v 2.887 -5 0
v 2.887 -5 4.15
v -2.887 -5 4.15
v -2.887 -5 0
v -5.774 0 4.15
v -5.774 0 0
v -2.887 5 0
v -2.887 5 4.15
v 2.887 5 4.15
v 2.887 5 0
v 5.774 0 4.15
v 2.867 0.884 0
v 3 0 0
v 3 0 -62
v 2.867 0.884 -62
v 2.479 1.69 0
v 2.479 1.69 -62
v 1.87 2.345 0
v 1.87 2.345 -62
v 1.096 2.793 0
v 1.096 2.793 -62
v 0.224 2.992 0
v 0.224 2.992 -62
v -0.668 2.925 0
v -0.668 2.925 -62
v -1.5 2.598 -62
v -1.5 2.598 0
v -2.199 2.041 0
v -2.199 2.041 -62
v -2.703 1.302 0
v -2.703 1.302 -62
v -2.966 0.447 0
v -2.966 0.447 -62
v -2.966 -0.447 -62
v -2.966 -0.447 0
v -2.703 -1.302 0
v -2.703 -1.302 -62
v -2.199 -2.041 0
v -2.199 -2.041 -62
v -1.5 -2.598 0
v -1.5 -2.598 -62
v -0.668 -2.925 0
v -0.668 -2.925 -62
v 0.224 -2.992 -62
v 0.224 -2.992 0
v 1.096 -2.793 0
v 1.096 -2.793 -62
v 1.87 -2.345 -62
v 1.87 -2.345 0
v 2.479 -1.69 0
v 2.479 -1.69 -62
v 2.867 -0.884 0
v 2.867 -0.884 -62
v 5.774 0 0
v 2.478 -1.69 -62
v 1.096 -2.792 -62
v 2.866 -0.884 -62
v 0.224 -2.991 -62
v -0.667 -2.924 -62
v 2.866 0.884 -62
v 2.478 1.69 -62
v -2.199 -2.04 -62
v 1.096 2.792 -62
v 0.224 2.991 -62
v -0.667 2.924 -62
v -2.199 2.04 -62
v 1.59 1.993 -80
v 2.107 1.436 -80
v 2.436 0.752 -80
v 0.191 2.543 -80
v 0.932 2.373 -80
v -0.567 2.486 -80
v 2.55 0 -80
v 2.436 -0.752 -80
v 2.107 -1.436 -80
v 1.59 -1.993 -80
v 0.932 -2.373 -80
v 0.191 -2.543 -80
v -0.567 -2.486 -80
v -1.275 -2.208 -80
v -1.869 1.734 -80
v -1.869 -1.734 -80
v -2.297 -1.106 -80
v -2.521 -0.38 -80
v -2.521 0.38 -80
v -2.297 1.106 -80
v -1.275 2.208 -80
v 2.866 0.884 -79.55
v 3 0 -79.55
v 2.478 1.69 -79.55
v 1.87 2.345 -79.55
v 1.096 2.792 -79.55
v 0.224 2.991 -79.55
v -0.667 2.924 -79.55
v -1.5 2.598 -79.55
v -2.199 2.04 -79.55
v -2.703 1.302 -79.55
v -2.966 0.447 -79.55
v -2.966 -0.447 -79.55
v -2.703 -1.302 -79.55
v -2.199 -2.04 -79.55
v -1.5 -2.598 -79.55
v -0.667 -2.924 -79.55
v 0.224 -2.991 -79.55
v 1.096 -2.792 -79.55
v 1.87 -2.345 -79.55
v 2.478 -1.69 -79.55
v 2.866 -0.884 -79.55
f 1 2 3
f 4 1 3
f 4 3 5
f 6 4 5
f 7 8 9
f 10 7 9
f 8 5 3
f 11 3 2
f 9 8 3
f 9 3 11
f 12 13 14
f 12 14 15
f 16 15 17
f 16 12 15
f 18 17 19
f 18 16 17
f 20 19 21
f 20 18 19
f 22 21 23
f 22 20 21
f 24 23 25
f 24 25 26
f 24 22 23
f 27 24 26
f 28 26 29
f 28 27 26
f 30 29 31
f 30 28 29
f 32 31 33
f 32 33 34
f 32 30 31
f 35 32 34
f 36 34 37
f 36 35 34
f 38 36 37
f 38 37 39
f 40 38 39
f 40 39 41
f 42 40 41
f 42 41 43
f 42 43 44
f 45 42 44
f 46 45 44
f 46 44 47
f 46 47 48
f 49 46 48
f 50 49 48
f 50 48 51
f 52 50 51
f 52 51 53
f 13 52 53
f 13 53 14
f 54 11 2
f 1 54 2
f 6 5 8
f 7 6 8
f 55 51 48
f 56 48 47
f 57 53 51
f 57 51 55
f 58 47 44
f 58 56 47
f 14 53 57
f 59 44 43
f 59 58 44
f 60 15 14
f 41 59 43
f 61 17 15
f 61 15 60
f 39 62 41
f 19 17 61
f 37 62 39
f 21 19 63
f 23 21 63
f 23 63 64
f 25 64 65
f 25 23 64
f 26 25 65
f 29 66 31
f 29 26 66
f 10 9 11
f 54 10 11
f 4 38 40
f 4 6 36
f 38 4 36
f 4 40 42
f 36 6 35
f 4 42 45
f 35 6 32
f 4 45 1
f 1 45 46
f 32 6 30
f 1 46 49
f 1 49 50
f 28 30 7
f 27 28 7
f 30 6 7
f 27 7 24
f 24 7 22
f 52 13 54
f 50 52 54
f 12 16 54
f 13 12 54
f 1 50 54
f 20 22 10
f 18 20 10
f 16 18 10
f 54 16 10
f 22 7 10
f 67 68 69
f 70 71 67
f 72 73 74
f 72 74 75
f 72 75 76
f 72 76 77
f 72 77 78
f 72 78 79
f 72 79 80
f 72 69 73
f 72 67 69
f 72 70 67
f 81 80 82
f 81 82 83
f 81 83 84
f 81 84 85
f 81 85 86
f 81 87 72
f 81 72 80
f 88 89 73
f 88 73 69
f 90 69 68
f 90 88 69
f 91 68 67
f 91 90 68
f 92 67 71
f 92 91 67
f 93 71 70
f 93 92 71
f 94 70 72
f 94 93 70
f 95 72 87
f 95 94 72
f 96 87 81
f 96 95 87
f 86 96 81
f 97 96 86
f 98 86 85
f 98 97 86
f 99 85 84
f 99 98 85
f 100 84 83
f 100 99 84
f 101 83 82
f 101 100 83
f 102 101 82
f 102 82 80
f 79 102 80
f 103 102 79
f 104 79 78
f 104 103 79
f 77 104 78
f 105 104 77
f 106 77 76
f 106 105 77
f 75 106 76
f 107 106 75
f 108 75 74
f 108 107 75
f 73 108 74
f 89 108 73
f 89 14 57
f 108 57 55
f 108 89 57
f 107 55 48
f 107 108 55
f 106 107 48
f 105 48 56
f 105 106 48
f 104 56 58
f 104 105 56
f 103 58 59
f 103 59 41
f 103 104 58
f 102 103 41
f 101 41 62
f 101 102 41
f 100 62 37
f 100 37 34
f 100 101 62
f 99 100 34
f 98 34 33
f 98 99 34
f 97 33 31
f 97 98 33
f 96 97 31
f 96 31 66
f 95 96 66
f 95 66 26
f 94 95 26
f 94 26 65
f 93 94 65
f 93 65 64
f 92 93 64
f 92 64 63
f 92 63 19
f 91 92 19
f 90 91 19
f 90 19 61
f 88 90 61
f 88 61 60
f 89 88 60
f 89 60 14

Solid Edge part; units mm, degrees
sketch "Sketch1" plane through (0, 0, 0) normal (0, 0, 1) x (1, 0, 0)
  circle A0 centre (0, 0) radius 5.8
  dimension "D1" = 11.6
extrude "Protrusion1" add sketch "Sketch1" along normal blind 4.15
sketch "Sketch2" plane through (0, 0, 0) normal (0, 0, -1) x (1, 0, 0)
  circle A0 centre (0, 0) radius 3
extrude "Protrusion2" add sketch "Sketch2" along normal blind 80
sketch "Sketch3" plane through (0, 0, -80) normal (0, 0, -1) x (1, 0, 0)
  circle A0 centre (0, 0) radius 2.9997
extrude "Cutout1" cut sketch "Sketch3" against normal blind 18 flip side to cut
chamfer "Chamfer_1" distance 0.45 angle 45 1 edges at (-2.9997, 0, -80)
sketch "Sketch4" plane through (0, 0, 4.15) normal (0, 0, 1) x (1, 0, 0)
  line L0 (-2.9394, 5) -> (2.9394, 5)
  dimension "D1" = 10
extrude "Cutout2" cut sketch "Sketch4" against normal up to next material side at (0, 5.05, 4.15)
pattern_circular "Pattern1" count 6 over 360 about axis through (0, 0, 4.15) along (0, 0, 1) of "Cutout2"
properties part number "118059"
